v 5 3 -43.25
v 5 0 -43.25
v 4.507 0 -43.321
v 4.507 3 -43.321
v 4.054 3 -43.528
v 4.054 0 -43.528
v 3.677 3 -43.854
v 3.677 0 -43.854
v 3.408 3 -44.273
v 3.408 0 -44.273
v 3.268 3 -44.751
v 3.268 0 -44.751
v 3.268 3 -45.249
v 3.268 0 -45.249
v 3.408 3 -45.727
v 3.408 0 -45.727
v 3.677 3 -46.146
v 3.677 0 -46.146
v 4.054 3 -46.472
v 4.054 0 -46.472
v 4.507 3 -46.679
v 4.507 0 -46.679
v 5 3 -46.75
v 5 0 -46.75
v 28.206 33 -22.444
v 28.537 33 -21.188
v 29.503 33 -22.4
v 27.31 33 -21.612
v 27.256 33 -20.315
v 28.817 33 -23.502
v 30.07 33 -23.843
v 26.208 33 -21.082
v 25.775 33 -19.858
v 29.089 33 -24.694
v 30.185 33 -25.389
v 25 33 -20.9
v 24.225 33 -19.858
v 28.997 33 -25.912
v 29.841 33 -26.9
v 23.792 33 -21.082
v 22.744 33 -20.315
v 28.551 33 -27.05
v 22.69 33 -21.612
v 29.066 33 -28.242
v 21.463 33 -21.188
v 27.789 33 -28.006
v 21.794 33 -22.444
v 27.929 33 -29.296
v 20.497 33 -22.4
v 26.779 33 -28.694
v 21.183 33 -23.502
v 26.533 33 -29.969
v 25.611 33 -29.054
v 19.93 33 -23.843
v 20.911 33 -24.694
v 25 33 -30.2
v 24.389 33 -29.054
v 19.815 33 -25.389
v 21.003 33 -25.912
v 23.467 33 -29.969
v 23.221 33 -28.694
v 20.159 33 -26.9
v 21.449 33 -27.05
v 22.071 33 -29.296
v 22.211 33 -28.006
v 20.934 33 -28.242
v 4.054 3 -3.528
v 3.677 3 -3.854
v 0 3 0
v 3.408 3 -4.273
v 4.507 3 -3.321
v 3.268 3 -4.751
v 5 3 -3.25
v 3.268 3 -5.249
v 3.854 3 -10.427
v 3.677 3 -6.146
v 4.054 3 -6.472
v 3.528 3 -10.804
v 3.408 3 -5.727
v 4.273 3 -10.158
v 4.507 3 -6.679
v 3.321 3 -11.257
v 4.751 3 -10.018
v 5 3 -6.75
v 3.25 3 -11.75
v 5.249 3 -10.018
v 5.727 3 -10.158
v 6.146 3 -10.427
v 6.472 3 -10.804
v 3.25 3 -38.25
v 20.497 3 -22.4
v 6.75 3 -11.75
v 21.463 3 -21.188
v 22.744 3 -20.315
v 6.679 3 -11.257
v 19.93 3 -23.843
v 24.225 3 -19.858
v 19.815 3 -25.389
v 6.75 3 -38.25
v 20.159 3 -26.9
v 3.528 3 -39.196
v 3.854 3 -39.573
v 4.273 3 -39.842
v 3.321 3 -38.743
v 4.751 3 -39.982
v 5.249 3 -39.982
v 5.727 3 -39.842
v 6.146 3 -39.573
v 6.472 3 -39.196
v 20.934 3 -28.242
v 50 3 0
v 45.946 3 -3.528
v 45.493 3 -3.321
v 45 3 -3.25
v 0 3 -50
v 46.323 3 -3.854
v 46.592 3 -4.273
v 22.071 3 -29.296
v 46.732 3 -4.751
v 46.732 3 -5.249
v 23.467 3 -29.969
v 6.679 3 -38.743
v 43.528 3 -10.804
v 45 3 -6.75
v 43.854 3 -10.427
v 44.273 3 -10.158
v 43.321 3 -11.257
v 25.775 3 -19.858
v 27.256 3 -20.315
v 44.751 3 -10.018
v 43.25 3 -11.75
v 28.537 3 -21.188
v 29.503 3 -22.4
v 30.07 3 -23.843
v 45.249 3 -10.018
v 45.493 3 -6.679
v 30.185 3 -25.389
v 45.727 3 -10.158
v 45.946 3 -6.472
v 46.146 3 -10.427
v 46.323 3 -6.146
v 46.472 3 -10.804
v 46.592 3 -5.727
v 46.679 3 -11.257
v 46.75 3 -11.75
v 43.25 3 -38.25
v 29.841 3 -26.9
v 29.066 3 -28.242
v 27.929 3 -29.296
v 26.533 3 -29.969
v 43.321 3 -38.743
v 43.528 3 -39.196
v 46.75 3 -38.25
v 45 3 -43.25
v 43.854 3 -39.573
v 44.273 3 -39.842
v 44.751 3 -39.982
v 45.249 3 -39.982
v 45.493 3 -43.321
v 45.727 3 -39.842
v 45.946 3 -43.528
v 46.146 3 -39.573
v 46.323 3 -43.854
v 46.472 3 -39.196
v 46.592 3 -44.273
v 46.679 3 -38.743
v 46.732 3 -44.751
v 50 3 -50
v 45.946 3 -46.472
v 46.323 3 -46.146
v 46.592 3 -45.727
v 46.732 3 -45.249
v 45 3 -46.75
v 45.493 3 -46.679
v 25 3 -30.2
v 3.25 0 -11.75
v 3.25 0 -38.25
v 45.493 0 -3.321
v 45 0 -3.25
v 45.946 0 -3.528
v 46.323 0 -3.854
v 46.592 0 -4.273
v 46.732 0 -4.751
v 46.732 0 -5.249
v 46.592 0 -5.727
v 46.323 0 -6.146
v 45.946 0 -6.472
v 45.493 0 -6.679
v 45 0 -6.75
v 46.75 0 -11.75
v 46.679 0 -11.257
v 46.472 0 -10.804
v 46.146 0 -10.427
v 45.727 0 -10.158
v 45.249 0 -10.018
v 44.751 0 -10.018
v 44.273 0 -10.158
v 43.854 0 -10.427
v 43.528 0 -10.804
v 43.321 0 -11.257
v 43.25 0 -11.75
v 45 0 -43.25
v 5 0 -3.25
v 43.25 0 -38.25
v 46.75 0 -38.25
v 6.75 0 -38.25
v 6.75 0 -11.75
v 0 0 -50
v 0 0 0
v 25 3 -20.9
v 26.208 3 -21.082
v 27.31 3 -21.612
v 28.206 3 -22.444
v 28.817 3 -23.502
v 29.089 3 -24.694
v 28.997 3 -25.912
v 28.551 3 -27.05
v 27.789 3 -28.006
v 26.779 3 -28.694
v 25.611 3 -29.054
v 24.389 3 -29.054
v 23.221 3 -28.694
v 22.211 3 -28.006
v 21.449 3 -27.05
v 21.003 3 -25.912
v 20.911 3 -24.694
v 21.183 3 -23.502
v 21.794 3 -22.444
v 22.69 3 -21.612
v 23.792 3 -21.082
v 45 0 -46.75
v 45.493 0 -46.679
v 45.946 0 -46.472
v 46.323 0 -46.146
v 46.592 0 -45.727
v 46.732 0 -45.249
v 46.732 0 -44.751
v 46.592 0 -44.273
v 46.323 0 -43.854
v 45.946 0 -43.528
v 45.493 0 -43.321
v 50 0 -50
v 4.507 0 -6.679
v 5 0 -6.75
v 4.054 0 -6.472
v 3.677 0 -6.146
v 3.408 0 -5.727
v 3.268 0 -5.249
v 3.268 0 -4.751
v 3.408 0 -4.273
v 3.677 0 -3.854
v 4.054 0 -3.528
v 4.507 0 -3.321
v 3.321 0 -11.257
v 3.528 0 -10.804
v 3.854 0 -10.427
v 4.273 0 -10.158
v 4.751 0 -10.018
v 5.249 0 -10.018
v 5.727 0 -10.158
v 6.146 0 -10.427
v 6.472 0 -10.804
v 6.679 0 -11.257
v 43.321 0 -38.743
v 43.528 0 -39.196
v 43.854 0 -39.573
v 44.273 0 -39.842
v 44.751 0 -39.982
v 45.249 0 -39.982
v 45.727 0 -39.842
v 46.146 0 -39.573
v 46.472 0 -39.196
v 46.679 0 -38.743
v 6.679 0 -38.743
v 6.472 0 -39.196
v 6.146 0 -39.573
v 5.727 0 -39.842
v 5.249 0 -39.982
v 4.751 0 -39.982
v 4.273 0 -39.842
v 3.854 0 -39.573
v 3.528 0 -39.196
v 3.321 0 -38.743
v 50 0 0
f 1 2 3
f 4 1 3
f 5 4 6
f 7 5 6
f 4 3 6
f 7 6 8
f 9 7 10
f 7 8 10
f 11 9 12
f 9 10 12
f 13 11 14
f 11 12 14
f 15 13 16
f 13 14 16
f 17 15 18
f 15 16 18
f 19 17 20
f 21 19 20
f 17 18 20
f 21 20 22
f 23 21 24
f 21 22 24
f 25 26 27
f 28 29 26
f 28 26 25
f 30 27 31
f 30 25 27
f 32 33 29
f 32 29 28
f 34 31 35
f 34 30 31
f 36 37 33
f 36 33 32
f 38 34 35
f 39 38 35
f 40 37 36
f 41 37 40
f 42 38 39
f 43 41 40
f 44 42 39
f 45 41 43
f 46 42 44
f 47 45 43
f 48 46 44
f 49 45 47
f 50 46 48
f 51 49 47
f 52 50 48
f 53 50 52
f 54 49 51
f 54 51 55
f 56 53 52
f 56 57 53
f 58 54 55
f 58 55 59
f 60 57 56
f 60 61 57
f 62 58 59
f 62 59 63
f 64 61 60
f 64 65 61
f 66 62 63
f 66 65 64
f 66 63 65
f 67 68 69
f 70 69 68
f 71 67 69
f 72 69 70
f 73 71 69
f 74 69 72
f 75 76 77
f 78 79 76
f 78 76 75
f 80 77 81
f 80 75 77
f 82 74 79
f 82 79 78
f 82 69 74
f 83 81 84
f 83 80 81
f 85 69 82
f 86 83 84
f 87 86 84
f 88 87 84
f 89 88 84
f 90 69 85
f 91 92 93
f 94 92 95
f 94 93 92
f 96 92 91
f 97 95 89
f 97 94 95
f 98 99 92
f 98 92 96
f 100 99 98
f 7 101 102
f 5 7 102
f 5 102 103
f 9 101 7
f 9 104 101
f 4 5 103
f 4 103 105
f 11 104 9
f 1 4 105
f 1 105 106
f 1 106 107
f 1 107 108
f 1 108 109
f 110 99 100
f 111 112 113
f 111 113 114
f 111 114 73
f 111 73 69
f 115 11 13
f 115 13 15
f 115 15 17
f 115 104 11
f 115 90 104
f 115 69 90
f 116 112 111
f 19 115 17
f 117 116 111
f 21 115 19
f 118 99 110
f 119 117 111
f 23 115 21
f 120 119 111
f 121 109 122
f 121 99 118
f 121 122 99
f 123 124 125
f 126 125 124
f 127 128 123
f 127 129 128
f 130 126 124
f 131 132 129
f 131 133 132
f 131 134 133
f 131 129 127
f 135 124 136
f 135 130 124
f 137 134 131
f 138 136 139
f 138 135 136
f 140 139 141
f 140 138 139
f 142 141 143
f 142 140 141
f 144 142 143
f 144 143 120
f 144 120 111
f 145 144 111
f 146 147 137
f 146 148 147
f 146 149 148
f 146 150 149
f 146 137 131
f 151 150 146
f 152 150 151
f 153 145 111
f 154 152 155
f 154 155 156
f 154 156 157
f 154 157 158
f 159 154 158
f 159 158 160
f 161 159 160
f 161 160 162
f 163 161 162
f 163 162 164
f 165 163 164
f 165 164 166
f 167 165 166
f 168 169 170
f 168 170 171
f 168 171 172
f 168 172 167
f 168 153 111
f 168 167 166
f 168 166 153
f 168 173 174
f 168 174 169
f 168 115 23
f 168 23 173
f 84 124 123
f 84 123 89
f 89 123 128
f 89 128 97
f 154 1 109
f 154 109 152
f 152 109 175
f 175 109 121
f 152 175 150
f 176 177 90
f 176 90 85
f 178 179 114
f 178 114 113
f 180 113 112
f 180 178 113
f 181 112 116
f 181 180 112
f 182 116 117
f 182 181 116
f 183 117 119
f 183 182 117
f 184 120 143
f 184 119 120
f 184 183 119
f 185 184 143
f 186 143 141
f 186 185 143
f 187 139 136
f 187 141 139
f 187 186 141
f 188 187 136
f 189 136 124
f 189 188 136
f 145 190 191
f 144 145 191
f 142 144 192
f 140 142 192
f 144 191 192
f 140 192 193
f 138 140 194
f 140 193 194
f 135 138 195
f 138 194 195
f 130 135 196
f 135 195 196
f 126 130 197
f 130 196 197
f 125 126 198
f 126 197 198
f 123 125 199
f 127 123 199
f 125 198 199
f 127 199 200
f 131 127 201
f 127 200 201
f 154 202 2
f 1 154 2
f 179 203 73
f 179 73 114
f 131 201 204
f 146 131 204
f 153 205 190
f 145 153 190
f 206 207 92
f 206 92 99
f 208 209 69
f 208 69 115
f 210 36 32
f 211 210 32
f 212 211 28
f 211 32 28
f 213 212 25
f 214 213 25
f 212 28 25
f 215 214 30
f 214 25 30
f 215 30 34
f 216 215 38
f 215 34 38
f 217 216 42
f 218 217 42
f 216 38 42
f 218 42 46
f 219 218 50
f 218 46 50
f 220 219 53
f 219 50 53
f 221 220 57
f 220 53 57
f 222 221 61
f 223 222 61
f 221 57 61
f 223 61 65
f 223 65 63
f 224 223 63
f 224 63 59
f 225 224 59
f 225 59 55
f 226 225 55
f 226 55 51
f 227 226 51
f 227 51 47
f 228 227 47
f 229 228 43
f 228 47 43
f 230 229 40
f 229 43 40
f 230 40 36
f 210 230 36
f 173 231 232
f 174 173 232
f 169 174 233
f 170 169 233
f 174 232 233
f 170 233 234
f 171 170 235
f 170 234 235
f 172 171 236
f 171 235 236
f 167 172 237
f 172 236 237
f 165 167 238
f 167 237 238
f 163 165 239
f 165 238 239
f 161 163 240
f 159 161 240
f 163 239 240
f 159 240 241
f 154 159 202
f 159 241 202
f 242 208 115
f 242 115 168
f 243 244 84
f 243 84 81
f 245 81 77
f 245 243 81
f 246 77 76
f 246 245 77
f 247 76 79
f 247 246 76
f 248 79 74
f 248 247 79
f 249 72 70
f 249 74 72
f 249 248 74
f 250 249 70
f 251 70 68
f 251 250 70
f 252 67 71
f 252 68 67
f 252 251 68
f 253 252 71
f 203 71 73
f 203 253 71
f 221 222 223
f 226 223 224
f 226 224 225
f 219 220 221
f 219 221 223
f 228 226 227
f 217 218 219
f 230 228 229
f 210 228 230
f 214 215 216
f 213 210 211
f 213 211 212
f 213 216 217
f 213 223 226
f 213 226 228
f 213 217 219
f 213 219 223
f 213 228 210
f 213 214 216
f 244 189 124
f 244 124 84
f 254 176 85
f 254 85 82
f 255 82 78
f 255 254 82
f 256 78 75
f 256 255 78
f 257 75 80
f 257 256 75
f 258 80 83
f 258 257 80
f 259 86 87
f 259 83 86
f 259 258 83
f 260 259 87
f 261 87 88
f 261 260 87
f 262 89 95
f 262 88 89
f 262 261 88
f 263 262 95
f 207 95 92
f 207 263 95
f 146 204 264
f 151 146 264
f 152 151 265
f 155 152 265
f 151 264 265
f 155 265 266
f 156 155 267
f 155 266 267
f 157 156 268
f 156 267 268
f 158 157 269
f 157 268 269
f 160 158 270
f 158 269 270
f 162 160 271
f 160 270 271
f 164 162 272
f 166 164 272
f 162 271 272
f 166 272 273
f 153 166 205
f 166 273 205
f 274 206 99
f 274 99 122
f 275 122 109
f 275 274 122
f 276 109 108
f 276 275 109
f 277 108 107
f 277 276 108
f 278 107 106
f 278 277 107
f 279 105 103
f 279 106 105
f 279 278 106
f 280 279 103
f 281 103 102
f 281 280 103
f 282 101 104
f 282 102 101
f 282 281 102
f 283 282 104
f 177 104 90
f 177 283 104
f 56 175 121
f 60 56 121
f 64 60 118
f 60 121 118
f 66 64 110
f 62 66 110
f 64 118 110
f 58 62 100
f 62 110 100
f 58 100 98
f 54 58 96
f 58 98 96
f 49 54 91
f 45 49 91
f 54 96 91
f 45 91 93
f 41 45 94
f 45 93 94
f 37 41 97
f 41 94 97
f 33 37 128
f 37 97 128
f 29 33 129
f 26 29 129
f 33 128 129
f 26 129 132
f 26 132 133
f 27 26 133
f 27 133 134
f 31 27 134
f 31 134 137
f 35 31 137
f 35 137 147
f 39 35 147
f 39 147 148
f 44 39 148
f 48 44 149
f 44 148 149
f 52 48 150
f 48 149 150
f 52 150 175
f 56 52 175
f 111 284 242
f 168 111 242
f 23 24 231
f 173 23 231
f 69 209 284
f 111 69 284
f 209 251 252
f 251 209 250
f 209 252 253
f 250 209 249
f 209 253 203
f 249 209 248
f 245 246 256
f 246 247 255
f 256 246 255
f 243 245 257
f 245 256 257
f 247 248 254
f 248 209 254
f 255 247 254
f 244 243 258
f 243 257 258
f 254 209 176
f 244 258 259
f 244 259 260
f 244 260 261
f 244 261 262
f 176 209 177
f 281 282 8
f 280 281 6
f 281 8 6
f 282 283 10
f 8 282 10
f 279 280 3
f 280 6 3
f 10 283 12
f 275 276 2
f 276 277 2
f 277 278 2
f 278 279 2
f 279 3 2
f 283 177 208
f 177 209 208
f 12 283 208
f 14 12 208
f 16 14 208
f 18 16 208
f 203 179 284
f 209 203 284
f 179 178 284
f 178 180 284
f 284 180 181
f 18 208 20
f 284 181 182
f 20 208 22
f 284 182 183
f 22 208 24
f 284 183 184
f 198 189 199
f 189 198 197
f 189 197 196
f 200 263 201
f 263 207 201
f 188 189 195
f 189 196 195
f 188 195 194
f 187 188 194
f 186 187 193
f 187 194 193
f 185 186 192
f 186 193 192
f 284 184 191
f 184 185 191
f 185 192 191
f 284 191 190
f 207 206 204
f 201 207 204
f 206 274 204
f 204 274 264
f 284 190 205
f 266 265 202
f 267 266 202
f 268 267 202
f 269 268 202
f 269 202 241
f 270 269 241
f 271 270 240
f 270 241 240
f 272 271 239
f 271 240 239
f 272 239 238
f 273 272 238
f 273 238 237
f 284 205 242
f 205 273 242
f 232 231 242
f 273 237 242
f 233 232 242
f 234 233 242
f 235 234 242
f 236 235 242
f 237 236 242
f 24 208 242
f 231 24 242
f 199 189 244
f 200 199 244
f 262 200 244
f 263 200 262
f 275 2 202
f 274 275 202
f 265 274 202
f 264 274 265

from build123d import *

# Parameters (mm, degrees)
SKETCH_1_W          = 50
SKETCH_1_H          = 50
EXTRUDE_1_DEPTH     = 3
SKETCH_2_R          = 5.2
EXTRUDE_3_DEPTH     = 30
SKETCH_4_R          = 4.1
CUT_EXTRUDE_1_DEPTH = 30
CUT_EXTRUDE_2_DEPTH = 30


with BuildPart() as part:
    # 草图1 → 凸台-拉伸1 (new body)
    with BuildSketch(Plane(origin=(0, 0, 0), x_dir=(1, 0, 0), z_dir=(0, 1, 0))):
        with Locations((25, 25)):
            Rectangle(SKETCH_1_W, SKETCH_1_H)
    extrude(amount=EXTRUDE_1_DEPTH)

    # 草图2 → 凸台-拉伸3 (add)
    with BuildSketch(Plane(origin=(0, 3, 0), x_dir=(1, 0, 0), z_dir=(0, 1, 0))):
        with Locations(Location((25, 25, 0), (0, 0, 90))):
            Circle(SKETCH_2_R)
    extrude(amount=EXTRUDE_3_DEPTH)

    # 草图4 → 切除-拉伸1 (cut)
    with BuildSketch(Plane(origin=(0, 33, 0), x_dir=(1, 0, 0), z_dir=(0, 1, 0))):
        with Locations(Location((25, 25, 0), (0, 0, 270))):
            Circle(SKETCH_4_R)
    extrude(amount=-CUT_EXTRUDE_1_DEPTH, mode=Mode.SUBTRACT)

    # 草图6 → 切除-拉伸2 (cut)
    with BuildSketch(Plane.XZ):
        with BuildLine():
            Line((5, -3.25), (45, -3.25))
            ThreePointArc((45, -3.25), (46.75, -5), (45, -6.75))
            Line((45, -6.75), (5, -6.75))
            ThreePointArc((5, -6.75), (3.25, -5), (5, -3.25))
        make_face()
        with BuildLine():
            Line((5, -46.75), (45, -46.75))
            ThreePointArc((45, -46.75), (46.75, -45), (45, -43.25))
            Line((45, -43.25), (5, -43.25))
            ThreePointArc((5, -43.25), (3.25, -45), (5, -46.75))
        make_face()
        with BuildLine():
            Line((6.75, -11.75), (6.75, -38.25))
            ThreePointArc((6.75, -38.25), (5, -40), (3.25, -38.25))
            Line((3.25, -38.25), (3.25, -11.75))
            ThreePointArc((3.25, -11.75), (5, -10), (6.75, -11.75))
        make_face()
        with BuildLine():
            Line((43.25, -11.75), (43.25, -38.25))
            ThreePointArc((43.25, -38.25), (45, -40), (46.75, -38.25))
            Line((46.75, -38.25), (46.75, -11.75))
            ThreePointArc((46.75, -11.75), (45, -10), (43.25, -11.75))
        make_face()
    extrude(amount=-CUT_EXTRUDE_2_DEPTH, mode=Mode.SUBTRACT)


solid = part.part
